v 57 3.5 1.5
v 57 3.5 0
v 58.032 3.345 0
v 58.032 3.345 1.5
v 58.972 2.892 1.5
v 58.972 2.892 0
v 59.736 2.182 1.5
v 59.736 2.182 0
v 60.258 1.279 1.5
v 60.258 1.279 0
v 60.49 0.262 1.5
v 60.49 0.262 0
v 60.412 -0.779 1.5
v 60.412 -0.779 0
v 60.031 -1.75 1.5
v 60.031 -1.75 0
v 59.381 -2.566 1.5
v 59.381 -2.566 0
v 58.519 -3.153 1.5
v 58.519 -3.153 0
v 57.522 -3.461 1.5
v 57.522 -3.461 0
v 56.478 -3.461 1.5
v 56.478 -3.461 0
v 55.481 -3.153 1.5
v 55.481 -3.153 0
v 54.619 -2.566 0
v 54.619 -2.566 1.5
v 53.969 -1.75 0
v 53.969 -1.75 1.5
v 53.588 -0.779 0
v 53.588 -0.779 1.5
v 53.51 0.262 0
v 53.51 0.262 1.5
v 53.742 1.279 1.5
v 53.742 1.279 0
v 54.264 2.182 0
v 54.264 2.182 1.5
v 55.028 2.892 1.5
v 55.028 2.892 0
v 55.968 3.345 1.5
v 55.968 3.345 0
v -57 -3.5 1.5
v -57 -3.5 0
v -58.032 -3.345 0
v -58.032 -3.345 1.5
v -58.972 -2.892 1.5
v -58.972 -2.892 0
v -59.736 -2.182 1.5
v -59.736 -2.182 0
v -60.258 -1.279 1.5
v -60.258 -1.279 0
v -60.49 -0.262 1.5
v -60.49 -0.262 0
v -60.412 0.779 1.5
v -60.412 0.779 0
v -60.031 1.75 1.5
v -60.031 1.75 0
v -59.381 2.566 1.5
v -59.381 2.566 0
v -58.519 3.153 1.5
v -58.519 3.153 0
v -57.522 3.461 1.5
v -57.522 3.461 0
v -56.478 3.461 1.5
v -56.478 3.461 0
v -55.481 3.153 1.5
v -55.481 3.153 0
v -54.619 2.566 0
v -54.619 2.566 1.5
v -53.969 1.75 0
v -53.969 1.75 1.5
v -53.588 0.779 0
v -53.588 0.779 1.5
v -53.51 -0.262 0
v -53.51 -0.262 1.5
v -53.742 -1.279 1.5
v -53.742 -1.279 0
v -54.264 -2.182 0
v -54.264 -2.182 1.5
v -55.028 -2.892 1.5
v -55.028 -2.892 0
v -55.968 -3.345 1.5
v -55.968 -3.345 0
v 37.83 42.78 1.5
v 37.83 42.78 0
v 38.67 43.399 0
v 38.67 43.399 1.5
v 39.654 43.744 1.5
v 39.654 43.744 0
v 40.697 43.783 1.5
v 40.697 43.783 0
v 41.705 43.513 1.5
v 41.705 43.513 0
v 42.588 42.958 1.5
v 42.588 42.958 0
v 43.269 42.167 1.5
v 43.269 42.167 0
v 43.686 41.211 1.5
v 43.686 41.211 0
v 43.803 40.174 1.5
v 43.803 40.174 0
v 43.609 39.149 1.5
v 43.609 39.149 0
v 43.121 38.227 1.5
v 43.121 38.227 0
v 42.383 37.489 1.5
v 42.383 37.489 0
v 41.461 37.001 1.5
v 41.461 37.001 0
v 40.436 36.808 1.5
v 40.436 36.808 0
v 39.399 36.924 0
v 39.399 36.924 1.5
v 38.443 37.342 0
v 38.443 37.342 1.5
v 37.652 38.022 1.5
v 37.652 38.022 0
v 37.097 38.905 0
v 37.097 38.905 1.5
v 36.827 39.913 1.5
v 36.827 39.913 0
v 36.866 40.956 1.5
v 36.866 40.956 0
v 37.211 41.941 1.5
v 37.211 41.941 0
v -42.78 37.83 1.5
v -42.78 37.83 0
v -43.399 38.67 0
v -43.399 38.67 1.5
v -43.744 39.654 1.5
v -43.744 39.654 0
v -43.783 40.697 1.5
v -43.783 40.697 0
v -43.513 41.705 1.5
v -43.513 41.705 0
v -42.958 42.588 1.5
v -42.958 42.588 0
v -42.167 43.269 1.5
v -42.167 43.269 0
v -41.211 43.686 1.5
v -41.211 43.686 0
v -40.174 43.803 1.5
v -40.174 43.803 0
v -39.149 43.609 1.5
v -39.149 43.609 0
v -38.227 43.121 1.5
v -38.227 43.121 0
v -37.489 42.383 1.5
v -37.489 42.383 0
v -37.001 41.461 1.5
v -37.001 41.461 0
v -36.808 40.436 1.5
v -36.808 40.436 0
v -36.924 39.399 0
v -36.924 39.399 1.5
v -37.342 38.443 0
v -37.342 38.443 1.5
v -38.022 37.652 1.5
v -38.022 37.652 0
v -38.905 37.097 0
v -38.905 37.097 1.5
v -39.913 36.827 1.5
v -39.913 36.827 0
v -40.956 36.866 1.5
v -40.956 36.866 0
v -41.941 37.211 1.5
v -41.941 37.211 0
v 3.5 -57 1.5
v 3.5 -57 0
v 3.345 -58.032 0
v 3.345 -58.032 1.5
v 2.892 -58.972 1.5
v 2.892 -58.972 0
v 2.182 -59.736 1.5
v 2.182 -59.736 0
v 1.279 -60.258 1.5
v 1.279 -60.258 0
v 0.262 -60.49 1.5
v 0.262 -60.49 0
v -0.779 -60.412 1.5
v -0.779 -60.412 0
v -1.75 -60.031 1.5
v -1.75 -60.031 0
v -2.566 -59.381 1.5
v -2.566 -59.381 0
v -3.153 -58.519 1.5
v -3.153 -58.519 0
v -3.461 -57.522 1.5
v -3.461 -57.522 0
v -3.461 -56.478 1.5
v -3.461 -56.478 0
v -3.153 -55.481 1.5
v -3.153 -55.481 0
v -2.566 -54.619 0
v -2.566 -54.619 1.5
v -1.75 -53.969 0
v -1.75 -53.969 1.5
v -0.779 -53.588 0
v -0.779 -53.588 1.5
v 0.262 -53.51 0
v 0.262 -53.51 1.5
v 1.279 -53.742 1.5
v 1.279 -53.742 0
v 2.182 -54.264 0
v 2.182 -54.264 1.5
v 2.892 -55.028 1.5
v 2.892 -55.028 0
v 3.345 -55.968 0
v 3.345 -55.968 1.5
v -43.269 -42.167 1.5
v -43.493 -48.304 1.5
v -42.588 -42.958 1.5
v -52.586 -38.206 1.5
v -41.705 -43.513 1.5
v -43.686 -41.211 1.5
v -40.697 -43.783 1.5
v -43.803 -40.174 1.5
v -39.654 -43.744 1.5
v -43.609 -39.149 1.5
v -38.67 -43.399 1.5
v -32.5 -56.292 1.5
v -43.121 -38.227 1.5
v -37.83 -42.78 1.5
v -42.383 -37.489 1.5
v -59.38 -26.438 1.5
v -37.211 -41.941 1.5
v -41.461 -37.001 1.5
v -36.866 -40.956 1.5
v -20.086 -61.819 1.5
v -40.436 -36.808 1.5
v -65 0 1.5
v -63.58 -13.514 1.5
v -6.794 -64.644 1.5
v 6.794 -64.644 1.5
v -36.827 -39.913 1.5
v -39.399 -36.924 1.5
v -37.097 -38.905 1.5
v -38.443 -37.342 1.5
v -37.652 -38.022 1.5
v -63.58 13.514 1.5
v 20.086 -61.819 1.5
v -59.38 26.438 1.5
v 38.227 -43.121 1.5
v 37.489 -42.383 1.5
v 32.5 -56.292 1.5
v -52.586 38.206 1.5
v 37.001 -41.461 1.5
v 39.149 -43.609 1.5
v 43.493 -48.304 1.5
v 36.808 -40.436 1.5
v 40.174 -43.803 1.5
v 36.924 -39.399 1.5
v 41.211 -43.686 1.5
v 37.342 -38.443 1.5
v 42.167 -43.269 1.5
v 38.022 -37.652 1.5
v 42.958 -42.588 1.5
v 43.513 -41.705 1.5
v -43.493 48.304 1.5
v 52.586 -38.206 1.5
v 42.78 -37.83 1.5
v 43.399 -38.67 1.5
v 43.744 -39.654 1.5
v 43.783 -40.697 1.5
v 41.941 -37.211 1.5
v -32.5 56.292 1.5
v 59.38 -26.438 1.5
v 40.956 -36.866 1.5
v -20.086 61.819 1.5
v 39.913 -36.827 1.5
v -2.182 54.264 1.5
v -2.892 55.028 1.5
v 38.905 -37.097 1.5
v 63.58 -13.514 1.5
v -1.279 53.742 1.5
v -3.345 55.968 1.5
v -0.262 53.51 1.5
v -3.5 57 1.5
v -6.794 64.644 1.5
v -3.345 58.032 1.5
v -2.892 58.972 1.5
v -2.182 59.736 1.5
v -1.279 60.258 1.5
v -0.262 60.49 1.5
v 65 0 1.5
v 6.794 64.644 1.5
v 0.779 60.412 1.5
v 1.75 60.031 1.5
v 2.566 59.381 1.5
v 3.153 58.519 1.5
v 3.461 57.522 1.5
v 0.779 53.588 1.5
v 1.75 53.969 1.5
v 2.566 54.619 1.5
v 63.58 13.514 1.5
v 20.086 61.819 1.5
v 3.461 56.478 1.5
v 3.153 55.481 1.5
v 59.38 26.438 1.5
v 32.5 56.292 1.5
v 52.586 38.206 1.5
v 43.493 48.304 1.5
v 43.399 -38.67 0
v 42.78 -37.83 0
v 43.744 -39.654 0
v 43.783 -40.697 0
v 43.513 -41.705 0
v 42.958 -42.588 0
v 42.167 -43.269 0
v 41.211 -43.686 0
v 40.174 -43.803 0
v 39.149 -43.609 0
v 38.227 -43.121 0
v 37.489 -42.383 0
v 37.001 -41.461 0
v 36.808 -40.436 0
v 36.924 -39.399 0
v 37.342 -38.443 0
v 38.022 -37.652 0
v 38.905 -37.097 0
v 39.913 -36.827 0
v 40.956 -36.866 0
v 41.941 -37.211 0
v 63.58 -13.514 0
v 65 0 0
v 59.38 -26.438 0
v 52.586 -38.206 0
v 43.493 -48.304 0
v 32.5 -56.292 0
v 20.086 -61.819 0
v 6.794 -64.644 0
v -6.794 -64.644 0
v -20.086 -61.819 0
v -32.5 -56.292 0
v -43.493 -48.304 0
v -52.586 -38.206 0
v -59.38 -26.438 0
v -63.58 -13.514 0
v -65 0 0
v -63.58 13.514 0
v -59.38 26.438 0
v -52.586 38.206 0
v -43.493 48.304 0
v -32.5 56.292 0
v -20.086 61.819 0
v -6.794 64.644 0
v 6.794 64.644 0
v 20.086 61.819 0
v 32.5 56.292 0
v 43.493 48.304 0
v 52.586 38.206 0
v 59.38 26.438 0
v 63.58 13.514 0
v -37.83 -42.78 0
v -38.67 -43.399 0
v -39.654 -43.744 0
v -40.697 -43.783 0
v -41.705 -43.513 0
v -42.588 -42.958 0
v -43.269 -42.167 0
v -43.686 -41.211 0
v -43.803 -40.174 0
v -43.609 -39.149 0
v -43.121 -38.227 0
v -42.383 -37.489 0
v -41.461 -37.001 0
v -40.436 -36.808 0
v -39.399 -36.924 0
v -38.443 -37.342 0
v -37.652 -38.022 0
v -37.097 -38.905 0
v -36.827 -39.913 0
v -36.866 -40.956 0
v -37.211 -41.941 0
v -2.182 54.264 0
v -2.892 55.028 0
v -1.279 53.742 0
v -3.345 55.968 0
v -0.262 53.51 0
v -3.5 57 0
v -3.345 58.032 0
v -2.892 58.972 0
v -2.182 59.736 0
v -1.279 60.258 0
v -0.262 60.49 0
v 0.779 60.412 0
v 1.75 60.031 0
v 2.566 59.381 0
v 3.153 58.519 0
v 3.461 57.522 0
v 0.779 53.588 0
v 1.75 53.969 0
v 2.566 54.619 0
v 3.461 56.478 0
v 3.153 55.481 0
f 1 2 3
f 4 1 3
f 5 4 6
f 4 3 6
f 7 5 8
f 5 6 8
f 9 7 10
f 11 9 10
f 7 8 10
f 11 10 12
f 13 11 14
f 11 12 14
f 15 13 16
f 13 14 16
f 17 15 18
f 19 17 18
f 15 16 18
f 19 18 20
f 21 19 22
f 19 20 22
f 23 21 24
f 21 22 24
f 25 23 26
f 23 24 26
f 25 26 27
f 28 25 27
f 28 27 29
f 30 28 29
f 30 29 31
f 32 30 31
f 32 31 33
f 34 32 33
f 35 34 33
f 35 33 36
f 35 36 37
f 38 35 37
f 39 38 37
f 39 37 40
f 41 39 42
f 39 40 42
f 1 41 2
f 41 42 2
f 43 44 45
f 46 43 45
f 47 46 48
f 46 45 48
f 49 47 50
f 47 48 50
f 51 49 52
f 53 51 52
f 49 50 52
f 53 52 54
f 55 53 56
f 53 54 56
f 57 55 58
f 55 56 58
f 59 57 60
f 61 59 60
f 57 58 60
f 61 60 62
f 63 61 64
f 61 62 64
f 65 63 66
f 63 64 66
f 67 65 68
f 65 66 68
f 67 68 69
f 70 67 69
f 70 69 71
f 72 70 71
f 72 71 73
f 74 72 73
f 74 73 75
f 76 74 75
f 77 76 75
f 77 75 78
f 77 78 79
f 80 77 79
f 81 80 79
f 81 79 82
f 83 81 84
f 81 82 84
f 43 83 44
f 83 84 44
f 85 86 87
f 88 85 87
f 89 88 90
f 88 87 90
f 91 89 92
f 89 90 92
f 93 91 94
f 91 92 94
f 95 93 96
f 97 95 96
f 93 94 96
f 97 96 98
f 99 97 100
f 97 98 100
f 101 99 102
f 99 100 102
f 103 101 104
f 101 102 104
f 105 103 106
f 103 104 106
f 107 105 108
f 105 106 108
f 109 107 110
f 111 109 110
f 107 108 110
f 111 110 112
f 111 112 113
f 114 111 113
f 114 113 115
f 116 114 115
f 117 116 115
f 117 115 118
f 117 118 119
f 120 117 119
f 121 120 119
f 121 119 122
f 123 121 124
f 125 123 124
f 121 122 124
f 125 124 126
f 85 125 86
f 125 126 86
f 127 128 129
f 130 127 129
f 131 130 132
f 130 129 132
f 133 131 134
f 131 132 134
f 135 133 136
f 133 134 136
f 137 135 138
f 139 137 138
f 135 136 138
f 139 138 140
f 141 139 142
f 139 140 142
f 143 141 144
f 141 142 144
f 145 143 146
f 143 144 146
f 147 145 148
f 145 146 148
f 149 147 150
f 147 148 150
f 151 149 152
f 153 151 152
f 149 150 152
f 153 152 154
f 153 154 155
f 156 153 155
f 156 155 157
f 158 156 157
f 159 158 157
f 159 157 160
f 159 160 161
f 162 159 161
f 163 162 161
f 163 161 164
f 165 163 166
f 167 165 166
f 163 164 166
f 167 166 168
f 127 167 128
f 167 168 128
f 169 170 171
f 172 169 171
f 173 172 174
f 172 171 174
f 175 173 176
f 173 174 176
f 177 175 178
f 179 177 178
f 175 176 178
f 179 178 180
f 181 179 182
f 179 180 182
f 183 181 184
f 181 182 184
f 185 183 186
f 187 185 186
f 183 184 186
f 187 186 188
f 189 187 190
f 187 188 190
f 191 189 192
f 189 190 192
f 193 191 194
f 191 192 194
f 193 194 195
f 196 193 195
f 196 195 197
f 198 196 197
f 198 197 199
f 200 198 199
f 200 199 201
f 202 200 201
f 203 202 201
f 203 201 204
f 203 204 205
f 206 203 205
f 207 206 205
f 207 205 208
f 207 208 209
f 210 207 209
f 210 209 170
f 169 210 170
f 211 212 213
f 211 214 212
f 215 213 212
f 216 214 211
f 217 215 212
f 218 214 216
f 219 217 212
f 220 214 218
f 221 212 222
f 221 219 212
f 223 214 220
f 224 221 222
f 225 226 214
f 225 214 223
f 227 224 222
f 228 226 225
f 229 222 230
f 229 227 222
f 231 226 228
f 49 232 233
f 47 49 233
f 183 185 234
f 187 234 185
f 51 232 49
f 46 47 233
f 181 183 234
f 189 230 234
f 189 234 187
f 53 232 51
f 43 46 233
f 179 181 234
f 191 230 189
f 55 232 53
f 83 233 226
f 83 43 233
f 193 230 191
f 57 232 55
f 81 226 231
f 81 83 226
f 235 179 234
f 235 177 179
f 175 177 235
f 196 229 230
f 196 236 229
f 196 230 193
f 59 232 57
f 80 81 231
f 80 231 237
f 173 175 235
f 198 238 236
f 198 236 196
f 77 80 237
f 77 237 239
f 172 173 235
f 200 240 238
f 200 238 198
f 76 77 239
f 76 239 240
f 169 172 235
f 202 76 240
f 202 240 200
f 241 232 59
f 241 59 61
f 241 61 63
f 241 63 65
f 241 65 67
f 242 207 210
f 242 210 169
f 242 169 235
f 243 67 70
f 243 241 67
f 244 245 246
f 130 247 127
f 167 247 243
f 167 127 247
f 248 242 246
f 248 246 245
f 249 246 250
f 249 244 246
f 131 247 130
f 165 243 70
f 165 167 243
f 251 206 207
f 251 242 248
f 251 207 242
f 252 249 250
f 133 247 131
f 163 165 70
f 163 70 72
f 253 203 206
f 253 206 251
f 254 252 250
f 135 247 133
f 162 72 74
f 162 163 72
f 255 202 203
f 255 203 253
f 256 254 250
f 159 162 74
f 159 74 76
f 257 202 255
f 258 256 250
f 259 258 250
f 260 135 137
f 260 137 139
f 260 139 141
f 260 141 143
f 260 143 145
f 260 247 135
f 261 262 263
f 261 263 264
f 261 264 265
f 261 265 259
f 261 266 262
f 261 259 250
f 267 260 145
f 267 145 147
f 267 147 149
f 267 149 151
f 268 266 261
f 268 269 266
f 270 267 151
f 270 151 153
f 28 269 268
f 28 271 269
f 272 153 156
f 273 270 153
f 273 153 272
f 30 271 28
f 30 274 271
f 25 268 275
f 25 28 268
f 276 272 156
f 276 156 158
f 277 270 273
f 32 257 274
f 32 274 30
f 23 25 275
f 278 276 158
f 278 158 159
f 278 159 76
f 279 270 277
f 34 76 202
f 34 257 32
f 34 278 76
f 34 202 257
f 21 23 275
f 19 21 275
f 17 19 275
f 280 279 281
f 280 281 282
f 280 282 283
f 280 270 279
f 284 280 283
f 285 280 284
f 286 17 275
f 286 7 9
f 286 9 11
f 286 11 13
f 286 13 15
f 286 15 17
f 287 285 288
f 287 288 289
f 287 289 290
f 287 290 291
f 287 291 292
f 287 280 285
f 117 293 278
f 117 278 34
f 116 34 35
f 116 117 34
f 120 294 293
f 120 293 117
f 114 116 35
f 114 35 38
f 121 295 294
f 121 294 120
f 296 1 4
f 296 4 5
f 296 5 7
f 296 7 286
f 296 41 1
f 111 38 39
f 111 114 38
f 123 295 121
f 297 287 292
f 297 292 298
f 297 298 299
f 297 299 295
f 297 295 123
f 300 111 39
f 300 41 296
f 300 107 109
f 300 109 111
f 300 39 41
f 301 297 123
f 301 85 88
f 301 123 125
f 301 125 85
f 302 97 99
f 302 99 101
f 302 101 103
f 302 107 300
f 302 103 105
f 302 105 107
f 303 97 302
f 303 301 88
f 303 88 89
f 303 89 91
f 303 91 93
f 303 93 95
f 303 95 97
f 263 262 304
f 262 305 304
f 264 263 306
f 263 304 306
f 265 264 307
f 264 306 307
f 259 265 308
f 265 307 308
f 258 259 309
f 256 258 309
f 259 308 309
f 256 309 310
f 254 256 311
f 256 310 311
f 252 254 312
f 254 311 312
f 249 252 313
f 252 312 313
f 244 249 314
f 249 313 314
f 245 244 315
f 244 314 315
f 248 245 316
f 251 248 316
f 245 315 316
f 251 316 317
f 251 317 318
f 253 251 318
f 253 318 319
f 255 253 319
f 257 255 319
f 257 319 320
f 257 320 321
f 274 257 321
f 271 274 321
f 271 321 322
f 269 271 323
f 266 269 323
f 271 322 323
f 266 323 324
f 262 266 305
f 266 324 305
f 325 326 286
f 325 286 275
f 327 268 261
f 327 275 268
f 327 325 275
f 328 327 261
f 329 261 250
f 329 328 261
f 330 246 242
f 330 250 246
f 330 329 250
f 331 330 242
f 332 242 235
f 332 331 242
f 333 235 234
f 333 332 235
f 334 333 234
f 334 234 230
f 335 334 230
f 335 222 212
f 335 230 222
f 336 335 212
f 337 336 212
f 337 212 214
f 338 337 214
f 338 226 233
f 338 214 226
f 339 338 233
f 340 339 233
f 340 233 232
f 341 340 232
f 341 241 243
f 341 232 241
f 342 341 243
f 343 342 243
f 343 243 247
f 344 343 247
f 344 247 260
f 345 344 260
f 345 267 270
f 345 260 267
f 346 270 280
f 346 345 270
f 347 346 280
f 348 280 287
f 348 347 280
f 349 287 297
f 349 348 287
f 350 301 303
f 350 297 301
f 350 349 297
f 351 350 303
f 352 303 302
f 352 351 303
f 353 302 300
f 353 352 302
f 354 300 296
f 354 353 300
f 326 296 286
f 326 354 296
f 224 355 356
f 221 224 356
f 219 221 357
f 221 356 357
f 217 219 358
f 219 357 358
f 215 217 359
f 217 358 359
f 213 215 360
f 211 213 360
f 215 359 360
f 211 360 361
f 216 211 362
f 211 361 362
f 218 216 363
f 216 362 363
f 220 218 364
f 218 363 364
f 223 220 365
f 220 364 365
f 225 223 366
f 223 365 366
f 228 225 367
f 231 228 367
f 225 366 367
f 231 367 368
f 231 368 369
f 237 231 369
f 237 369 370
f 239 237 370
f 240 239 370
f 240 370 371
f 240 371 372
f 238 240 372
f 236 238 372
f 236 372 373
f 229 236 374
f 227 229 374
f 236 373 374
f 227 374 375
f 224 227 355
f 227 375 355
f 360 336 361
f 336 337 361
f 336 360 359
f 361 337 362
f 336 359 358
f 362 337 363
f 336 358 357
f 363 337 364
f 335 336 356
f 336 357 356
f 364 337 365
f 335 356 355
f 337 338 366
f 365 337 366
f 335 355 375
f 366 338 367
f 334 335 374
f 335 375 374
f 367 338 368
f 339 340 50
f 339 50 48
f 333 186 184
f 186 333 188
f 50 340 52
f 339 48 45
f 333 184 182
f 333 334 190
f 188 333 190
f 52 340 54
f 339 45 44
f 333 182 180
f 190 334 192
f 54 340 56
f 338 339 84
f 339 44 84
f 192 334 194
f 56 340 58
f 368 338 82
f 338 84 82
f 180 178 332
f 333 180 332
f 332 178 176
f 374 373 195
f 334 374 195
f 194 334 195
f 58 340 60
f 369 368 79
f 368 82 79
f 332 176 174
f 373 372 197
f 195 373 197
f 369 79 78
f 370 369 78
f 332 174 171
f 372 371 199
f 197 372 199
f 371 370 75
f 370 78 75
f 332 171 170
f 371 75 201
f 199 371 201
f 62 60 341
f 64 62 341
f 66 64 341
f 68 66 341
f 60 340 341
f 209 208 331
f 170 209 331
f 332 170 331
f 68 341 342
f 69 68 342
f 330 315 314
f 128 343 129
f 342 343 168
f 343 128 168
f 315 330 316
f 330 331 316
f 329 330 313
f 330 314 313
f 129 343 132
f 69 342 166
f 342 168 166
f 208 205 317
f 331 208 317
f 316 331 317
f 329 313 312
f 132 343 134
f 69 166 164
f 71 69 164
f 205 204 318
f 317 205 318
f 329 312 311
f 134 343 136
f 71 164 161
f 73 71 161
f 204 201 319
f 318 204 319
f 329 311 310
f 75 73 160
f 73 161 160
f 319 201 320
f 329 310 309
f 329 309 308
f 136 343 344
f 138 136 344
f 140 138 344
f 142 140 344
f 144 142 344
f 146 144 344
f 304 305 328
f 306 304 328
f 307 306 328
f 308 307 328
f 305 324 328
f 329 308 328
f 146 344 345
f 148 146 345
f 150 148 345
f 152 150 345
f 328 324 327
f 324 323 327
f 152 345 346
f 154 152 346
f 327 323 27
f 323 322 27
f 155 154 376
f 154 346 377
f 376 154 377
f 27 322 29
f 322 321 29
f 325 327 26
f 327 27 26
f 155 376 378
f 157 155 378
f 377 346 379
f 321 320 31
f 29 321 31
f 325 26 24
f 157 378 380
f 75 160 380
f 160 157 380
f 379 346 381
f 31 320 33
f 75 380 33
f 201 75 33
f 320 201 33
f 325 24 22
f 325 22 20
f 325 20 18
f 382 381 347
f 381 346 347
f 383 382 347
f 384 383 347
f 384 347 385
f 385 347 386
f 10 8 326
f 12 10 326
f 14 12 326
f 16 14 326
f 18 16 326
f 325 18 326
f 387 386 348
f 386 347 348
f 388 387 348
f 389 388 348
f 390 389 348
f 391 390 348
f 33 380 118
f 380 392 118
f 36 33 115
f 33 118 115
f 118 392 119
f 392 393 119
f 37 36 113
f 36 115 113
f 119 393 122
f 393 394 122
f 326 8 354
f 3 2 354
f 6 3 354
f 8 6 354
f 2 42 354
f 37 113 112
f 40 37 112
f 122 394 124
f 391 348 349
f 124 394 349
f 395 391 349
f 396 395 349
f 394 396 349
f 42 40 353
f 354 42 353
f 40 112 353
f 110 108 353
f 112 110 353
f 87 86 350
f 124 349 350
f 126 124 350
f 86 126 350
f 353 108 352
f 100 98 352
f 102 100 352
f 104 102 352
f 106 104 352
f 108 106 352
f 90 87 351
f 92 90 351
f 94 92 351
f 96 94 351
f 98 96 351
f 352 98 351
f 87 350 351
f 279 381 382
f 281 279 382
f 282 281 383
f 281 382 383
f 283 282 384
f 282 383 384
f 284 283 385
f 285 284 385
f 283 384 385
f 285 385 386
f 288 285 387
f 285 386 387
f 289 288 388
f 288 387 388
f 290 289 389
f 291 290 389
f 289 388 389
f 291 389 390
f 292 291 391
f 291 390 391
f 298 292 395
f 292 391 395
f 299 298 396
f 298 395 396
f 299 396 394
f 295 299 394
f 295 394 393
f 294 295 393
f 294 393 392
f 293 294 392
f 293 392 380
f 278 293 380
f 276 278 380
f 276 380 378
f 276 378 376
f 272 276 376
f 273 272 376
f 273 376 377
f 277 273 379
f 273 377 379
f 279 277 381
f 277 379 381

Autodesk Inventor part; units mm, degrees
ref_plane "YZ Plane" through (0, 0, 0) normal (1, 0, 0) x (0, 1, 0)
ref_plane "XZ Plane" through (0, 0, 0) normal (0, 1, 0) x (-1, 0, 0)
ref_plane "XY Plane" through (0, 0, 0) normal (0, 0, 1) x (1, 0, 0)
sketch "Sketch1" plane through (0, 0, 0) normal (0, 0, 1) x (1, 0, 0)
  circle A0 centre (0, 0) radius 65
  dimension "d0" = 130
extrude "Extrusion1" add sketch "Sketch1" along normal blind 1.5
sketch "Sketch2" plane through (0, 0, 1.5) normal (0, 0, 1) x (1, 0, 0)
  circle A0 centre (0, 0) radius 57 construction
  point P0 (-57, 0)
  dimension "d3" = 114
hole "Hole1" at (-57, 0, 1.5) direction (0, 0, -1) diameter 7 end through all
pattern_circular "Circular Pattern1" count 8 over 360 about axis through (0, 0, -10) along (0, 0, 1) of "Hole1"
properties material "Rubber"
